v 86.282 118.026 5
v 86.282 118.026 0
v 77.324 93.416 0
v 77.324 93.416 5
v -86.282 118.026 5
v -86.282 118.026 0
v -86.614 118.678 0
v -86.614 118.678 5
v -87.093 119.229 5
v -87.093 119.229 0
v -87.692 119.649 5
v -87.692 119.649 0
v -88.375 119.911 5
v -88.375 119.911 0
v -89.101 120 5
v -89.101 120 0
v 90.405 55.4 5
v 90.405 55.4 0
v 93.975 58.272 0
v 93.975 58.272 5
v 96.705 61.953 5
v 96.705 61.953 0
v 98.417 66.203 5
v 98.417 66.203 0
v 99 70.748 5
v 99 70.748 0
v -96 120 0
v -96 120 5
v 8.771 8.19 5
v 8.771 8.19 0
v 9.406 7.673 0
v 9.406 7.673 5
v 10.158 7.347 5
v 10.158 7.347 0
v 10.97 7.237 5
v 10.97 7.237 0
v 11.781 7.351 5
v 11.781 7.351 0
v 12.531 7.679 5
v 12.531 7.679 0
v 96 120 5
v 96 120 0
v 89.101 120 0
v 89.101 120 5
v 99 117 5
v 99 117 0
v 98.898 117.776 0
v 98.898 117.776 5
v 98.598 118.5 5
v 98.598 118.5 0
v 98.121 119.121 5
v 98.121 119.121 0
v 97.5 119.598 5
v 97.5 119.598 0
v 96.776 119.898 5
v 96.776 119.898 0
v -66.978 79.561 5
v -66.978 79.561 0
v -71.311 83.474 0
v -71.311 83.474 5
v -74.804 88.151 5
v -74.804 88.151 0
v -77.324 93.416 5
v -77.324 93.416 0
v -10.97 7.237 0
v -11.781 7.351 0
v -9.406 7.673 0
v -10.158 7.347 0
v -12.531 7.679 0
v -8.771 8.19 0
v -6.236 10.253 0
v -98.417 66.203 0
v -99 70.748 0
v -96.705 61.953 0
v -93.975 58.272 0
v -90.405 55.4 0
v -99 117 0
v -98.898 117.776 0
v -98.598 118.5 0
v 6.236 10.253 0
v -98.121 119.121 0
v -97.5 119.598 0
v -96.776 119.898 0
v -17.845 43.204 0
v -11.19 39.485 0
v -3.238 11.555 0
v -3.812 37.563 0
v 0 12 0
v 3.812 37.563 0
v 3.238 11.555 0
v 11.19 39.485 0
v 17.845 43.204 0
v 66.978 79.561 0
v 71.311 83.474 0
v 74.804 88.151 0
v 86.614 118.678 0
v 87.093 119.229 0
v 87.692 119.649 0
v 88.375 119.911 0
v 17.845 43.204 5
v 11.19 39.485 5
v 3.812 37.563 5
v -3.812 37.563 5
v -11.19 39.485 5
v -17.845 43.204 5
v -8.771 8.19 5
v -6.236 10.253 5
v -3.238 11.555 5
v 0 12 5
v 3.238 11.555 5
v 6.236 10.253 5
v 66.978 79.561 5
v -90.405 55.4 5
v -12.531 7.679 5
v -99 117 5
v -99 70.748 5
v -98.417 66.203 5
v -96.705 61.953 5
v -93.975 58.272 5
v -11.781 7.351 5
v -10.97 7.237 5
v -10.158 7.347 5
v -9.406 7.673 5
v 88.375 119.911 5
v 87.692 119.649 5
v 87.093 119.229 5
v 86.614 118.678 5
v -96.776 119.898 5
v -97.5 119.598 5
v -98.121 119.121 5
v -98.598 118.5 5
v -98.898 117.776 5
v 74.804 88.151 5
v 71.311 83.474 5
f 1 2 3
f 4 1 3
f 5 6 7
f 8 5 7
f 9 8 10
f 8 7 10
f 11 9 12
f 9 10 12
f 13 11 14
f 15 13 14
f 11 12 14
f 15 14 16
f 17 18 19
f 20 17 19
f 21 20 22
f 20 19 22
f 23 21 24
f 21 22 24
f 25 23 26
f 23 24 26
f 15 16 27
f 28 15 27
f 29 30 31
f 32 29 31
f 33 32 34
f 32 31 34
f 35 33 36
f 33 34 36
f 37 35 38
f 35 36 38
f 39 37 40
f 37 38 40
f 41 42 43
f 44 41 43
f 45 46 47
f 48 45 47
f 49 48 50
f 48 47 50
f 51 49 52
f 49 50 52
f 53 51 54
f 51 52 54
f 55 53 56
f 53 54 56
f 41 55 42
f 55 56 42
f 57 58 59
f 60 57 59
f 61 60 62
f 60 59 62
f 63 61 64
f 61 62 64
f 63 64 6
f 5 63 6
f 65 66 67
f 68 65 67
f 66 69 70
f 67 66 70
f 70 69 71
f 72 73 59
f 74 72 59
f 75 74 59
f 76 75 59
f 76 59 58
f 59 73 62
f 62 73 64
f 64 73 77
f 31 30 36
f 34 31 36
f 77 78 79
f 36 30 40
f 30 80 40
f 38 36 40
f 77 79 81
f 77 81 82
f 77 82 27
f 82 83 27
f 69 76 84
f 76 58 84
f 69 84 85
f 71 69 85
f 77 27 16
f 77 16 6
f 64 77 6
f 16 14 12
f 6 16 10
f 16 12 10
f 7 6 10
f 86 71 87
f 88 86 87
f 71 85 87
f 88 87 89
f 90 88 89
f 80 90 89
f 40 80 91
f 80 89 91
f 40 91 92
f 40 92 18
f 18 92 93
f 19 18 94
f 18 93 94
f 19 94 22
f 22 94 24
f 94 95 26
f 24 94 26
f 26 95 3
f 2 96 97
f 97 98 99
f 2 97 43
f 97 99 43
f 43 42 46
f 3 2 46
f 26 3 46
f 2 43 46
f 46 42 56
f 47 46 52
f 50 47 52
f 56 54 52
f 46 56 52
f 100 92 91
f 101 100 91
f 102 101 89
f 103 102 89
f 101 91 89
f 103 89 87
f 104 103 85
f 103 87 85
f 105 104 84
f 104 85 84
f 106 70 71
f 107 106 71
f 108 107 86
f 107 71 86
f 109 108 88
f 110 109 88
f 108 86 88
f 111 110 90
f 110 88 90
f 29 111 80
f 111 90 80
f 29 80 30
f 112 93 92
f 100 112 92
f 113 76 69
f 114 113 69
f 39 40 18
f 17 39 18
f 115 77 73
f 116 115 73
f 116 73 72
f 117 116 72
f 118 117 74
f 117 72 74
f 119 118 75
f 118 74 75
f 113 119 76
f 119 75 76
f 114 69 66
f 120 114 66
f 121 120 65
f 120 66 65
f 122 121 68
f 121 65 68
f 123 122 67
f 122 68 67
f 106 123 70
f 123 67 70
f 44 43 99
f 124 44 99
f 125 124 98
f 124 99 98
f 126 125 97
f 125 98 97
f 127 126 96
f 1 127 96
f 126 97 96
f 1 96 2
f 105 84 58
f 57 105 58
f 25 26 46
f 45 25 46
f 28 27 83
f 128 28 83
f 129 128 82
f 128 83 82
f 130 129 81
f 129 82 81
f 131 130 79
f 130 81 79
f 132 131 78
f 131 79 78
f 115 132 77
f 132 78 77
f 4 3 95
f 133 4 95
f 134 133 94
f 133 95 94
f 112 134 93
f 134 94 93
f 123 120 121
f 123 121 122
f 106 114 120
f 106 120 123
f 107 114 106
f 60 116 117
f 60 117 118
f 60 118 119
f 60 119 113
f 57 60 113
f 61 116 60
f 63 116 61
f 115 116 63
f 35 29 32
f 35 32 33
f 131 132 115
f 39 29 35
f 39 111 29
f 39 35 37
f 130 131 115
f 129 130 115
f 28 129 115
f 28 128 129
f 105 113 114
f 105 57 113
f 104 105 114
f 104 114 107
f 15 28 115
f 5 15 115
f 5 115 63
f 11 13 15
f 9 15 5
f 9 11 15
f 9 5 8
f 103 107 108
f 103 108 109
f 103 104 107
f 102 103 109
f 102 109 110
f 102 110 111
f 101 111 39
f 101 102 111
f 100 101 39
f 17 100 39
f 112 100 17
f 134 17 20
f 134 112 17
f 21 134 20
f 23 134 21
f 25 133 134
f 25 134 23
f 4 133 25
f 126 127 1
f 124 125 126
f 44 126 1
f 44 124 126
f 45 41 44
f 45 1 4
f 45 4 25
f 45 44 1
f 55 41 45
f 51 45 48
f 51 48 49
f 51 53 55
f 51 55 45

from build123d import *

# Parameters (mm, degrees)
BASE_EXTRUDE_DEPTH = 5


with BuildPart() as part:
    # Sketch1 → Base-Extrude (new body)
    with BuildSketch(Plane.XY):
        with BuildLine():
            Line((-99, 117), (-99, 70.747762378))
            ThreePointArc((-99, 70.747762378), (-96.704928127, 61.952580031), (-90.404974165, 55.40023942))
            Line((-90.404974165, 55.40023942), (-12.531200021, 7.679129249))
            ThreePointArc((-12.531200021, 7.679129249), (-10.560110304, 7.264321725), (-8.770963462, 8.189639794))
            ThreePointArc((-8.770963462, 8.189639794), (0, 12), (8.770963462, 8.189639794))
            ThreePointArc((8.770963462, 8.189639794), (10.560110304, 7.264321725), (12.531200021, 7.679129249))
            Line((12.531200021, 7.679129249), (90.404974165, 55.40023942))
            ThreePointArc((90.404974165, 55.40023942), (96.704928127, 61.952580031), (99, 70.747762378))
            Line((99, 70.747762378), (99, 117))
            ThreePointArc((99, 117), (98.121320344, 119.121320344), (96, 120))
            Line((96, 120), (89.100622615, 120))
            ThreePointArc((89.100622615, 120), (87.379893306, 119.457456133), (86.281544752, 118.02606043))
            Line((86.281544752, 118.02606043), (77.324366423, 93.416415229))
            ThreePointArc((77.324366423, 93.416415229), (73.17120218, 85.727281512), (66.978271402, 79.56131371))
            Line((66.978271402, 79.56131371), (17.844683603, 43.204371262))
            ThreePointArc((17.844683603, 43.204371262), (0, 37.320077081), (-17.844683603, 43.204371262))
            Line((-17.844683603, 43.204371262), (-66.978271402, 79.56131371))
            ThreePointArc((-66.978271402, 79.56131371), (-73.17120218, 85.727281512), (-77.324366423, 93.416415229))
            Line((-77.324366423, 93.416415229), (-86.281544752, 118.02606043))
            ThreePointArc((-86.281544752, 118.02606043), (-87.379893306, 119.457456133), (-89.100622615, 120))
            Line((-89.100622615, 120), (-96, 120))
            ThreePointArc((-96, 120), (-98.121320344, 119.121320344), (-99, 117))
        make_face()
    extrude(amount=BASE_EXTRUDE_DEPTH)


solid = part.part
